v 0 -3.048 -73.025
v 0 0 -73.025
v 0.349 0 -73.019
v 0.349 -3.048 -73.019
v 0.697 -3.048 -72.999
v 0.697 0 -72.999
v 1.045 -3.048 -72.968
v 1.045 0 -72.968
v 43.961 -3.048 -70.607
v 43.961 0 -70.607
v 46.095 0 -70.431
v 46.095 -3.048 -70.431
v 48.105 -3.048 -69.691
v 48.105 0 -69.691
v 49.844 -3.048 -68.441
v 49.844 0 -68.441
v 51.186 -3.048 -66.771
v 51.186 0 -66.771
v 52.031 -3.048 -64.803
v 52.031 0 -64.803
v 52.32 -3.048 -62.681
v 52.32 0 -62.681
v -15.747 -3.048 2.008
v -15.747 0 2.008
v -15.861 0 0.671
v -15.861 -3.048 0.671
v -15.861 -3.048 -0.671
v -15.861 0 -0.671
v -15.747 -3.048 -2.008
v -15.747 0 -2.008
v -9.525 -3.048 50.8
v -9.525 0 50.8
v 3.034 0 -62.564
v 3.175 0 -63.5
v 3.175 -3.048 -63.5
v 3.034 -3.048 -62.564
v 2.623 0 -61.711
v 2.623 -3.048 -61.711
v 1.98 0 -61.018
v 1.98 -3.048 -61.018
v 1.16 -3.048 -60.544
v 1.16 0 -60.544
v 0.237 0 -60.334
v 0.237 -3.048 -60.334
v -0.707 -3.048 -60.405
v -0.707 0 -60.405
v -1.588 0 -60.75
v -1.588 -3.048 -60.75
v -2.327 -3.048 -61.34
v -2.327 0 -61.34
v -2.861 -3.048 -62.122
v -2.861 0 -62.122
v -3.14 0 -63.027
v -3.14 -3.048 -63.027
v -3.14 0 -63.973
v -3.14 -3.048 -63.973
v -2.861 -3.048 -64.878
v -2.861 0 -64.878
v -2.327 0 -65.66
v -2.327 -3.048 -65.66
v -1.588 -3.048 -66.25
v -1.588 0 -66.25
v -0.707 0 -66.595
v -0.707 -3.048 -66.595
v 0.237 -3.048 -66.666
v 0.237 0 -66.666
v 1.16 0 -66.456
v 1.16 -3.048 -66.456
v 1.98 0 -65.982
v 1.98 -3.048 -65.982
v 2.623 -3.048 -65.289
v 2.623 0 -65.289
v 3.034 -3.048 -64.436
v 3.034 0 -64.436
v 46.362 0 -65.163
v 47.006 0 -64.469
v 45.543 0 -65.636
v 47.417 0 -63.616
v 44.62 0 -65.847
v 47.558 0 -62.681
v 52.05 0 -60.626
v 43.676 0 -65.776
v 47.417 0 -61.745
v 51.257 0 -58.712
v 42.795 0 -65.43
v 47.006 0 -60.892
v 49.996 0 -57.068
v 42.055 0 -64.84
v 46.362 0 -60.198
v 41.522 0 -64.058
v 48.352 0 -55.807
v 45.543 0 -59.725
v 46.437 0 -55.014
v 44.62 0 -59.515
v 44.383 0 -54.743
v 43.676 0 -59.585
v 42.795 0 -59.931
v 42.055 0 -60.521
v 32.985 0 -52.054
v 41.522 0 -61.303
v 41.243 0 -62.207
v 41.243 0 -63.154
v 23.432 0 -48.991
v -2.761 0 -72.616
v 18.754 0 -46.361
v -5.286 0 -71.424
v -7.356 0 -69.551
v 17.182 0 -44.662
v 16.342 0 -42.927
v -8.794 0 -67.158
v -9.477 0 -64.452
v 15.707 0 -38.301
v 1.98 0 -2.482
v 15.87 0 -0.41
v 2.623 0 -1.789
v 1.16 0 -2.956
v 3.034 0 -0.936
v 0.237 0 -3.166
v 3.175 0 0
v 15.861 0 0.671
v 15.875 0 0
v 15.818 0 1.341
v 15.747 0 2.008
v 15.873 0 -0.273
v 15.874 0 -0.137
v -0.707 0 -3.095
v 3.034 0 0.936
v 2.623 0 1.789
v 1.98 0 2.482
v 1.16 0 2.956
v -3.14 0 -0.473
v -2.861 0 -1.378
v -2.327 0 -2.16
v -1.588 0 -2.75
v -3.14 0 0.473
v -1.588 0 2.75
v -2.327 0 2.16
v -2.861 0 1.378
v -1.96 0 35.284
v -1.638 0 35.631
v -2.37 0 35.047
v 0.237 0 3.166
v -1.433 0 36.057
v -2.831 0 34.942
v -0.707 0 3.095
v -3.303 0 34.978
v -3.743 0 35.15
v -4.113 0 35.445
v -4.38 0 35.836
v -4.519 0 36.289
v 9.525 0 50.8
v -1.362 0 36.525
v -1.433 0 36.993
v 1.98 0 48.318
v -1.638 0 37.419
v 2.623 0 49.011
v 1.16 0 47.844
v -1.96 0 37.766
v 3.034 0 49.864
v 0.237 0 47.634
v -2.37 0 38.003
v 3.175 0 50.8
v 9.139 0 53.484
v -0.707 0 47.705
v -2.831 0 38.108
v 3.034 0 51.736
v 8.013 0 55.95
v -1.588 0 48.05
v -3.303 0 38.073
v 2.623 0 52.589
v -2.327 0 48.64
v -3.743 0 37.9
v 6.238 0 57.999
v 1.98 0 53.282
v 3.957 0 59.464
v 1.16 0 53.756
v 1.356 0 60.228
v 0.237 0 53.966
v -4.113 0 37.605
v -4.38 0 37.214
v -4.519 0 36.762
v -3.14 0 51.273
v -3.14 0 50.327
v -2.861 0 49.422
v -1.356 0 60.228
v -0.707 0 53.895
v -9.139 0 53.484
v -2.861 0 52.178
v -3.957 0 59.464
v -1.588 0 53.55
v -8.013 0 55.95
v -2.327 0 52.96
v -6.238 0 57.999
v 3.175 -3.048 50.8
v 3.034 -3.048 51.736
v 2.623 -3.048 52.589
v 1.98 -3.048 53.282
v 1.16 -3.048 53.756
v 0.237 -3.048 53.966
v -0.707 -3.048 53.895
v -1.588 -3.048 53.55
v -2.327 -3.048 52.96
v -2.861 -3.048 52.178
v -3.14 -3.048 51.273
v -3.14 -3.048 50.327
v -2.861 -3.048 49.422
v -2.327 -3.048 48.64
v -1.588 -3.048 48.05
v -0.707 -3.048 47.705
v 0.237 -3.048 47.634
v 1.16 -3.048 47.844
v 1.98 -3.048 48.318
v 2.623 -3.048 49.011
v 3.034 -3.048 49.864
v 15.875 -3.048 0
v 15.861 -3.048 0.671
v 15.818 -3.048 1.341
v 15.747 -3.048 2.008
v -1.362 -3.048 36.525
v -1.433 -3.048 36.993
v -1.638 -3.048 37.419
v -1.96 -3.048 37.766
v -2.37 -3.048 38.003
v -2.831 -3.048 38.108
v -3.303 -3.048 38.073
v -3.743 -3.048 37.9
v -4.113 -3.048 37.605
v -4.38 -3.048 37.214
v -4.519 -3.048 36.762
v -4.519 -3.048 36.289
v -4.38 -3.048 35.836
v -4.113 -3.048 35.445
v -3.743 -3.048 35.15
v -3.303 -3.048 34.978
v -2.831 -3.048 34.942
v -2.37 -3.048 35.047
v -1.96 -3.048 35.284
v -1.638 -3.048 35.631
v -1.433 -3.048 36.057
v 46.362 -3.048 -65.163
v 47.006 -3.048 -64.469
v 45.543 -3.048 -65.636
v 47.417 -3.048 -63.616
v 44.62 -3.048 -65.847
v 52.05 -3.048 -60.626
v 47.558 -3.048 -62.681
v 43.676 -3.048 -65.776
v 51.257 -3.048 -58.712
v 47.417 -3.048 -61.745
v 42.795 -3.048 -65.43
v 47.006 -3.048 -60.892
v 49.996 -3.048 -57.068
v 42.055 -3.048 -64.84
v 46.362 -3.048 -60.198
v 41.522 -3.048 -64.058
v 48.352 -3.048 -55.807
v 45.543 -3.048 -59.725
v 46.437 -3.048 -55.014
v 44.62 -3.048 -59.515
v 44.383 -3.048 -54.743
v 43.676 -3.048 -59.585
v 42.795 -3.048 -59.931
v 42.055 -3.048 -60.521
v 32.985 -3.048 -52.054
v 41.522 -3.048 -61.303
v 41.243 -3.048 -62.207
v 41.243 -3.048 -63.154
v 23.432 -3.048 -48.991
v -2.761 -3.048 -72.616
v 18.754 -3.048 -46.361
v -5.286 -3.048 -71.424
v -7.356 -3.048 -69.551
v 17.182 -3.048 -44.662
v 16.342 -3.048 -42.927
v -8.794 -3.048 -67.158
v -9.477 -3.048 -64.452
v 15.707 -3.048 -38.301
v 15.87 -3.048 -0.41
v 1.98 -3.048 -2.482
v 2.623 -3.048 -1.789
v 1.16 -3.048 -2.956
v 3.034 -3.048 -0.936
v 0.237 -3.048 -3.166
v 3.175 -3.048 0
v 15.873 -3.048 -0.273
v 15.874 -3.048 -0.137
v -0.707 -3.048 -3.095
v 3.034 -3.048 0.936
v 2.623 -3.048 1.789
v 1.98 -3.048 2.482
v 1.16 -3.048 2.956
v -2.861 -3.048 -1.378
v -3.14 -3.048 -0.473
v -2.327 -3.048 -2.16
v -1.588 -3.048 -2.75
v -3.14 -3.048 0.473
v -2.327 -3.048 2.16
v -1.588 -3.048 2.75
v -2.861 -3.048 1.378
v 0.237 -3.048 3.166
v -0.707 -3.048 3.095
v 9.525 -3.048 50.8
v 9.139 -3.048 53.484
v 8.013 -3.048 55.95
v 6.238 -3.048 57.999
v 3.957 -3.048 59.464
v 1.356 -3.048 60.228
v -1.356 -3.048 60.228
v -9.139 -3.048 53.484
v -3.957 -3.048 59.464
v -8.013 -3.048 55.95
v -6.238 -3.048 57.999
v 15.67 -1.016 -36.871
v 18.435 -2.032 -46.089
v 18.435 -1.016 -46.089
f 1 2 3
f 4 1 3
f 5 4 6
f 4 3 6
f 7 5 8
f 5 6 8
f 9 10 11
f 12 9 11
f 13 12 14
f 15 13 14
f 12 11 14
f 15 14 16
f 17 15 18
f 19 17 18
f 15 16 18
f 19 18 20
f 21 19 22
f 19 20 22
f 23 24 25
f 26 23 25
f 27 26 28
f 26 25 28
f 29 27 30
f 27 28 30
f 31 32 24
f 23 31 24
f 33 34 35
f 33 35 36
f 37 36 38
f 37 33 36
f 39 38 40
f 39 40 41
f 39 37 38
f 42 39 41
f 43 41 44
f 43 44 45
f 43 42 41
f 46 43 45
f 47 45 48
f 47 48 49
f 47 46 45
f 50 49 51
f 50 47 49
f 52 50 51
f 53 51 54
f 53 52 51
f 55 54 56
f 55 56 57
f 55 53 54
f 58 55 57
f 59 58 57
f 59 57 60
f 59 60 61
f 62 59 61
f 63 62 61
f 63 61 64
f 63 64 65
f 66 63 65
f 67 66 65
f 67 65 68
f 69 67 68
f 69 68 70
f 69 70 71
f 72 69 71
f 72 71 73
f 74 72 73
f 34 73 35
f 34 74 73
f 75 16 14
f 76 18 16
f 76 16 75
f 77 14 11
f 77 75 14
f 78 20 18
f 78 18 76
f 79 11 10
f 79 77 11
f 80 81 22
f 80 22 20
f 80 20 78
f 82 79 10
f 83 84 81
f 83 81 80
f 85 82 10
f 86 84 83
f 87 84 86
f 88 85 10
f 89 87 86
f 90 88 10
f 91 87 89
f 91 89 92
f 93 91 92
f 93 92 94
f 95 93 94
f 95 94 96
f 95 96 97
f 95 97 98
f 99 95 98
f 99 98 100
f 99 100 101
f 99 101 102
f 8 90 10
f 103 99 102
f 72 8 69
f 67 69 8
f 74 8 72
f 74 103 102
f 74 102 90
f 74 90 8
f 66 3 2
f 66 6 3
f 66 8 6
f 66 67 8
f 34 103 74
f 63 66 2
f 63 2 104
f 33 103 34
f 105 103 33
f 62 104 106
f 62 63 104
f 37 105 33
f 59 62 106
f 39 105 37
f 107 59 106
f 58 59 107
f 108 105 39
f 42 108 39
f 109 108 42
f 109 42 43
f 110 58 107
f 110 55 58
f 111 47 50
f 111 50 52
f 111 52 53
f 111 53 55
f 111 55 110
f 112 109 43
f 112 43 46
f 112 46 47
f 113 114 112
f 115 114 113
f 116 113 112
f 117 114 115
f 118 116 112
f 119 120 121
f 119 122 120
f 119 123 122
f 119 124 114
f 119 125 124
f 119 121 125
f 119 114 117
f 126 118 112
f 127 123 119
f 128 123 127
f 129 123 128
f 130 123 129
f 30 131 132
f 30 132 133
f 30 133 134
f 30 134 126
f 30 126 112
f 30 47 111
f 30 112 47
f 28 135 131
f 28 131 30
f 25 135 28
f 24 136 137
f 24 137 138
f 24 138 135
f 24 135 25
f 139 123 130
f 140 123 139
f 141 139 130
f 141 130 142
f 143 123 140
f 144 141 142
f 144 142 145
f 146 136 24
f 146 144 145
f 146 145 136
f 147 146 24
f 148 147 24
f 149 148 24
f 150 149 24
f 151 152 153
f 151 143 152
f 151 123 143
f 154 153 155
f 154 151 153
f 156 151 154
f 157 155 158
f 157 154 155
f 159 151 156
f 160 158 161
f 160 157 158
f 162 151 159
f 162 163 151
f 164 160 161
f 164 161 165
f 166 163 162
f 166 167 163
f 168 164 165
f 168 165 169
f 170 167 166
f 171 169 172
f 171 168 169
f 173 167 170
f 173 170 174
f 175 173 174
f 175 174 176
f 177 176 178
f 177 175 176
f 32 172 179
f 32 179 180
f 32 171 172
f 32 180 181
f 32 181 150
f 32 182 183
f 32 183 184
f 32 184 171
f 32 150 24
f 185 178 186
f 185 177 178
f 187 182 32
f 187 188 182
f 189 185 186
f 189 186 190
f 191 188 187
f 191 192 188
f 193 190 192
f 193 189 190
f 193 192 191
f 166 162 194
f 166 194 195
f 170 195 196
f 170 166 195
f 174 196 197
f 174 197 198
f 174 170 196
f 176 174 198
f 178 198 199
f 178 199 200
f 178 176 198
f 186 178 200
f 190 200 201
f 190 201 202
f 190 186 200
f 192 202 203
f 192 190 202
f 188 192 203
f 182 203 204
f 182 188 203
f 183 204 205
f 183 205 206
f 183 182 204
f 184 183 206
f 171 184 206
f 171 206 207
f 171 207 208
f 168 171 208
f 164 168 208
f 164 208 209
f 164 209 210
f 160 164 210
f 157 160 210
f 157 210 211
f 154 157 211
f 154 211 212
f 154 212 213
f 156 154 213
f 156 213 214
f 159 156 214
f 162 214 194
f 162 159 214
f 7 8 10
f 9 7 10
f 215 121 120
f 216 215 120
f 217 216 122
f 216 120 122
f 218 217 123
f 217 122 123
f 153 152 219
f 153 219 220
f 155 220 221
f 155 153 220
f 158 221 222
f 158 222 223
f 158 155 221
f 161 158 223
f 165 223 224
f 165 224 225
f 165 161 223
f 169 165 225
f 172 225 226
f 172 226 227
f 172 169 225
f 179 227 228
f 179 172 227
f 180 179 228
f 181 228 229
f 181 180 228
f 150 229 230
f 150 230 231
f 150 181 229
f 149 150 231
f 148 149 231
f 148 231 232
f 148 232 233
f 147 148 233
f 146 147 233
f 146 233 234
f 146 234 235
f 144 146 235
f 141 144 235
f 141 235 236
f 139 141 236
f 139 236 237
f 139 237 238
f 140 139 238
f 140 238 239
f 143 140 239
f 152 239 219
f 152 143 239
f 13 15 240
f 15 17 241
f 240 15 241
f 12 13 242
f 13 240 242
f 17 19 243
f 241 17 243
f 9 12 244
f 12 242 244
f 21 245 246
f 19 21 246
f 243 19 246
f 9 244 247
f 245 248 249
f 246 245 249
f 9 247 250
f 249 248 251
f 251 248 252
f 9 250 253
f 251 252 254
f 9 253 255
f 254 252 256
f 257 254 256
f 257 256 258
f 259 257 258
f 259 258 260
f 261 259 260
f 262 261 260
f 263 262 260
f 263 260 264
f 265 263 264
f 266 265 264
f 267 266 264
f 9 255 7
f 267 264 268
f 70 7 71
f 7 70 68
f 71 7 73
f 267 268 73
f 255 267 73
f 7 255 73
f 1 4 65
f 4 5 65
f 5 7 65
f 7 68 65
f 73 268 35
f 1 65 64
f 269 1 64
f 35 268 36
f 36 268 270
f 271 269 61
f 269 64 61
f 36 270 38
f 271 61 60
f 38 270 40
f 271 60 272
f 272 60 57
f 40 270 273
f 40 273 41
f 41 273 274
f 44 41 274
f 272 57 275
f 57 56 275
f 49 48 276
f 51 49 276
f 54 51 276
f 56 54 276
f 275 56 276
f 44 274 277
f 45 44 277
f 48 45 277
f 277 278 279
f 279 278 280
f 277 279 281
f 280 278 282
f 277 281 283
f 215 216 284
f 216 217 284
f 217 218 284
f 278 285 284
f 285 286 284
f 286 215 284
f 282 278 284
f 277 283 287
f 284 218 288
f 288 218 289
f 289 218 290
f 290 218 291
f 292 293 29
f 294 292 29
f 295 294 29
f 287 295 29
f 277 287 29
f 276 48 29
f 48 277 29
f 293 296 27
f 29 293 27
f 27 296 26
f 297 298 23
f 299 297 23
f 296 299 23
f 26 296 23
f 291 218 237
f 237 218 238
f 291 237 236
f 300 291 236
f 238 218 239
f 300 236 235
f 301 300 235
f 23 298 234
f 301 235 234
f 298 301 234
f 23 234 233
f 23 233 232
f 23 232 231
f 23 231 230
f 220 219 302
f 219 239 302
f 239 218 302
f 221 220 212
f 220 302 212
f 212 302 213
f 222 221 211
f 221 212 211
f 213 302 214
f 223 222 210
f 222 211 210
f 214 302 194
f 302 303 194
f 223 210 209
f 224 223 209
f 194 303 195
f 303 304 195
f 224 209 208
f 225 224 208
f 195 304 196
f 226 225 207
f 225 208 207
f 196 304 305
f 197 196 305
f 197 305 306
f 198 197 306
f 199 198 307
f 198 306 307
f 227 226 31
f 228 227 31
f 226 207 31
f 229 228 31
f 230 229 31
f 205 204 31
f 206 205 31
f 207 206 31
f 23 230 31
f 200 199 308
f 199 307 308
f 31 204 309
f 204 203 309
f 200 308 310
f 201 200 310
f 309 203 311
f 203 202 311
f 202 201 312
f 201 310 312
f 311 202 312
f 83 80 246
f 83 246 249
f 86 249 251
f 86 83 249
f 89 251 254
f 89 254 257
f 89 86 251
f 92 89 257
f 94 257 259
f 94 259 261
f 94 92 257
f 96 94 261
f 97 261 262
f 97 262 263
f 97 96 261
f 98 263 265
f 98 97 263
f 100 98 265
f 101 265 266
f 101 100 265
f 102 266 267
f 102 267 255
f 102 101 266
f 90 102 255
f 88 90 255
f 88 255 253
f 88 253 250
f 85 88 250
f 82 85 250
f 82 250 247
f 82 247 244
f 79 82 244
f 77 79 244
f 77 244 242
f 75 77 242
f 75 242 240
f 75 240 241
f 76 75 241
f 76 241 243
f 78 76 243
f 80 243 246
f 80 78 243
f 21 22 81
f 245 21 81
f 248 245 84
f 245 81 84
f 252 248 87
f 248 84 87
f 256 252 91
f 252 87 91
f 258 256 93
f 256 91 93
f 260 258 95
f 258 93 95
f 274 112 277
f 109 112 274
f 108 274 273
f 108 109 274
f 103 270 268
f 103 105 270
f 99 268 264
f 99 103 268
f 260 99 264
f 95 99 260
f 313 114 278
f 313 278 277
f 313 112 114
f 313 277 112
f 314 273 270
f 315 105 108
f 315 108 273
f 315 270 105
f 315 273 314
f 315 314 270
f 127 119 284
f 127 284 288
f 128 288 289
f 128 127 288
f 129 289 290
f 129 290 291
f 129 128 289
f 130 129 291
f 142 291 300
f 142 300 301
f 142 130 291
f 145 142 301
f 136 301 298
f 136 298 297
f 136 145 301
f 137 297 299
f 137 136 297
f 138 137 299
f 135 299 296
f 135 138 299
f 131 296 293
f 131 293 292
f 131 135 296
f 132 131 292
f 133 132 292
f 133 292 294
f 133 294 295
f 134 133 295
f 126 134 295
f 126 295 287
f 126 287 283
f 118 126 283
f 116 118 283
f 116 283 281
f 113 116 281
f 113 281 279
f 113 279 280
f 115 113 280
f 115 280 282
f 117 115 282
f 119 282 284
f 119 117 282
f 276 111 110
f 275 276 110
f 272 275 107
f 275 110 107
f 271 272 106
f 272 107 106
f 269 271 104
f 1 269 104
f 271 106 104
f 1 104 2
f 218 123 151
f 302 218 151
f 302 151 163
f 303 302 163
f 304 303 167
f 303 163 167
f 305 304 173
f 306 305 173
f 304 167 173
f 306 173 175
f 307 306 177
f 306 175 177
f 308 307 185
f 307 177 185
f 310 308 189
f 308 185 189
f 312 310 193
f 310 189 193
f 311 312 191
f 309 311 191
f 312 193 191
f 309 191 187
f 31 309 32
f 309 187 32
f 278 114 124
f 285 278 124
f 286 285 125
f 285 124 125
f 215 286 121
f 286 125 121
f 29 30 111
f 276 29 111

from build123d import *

# Parameters (mm, degrees)
F0_R     = 3.175
F0_R_2   = 1.5875
F1_DEPTH = 3.048


with BuildPart() as f1:
    # F0 (on Front) → F1 (new body)
    with BuildSketch(Plane.XZ):
        with BuildLine():
            add(Edge.make_bspline(
                [(15.875, 0), (15.8732372033, -0.1365743579), (15.8714744066, -0.2731487158), (15.8697119149, -0.4097178745)],
                knots=[0, 0, 0, 0, 0.0040359027, 0.0040359027, 0.0040359027, 0.0040359027], degree=3))
            ThreePointArc((15.875, 0), (15.8430821396, 1.0061676396), (15.7474569047, 2.0082893304))
            ThreePointArc((15.7474569047, 2.0082893304), (0, 15.875), (-15.7474569047, 2.0082893304))
            ThreePointArc((-15.7474569047, 2.0082893304), (-15.875, 0), (-15.7474569047, -2.0082893304))
            ThreePointArc((-15.7474569047, -2.0082893304), (0.8016197645, -15.8547478931), (15.8697119149, -0.4097178745))
        make_face()
        Circle(F0_R, mode=Mode.SUBTRACT)
        with BuildLine():
            ThreePointArc((15.8697119149, -0.4097178745), (15.8736779237, -0.2048759994), (15.875, 0))
            add(Edge.make_bspline(
                [(15.875, 0), (15.8732372033, -0.1365743579), (15.8714744066, -0.2731487158), (15.8697119149, -0.4097178745)],
                knots=[0, 0, 0, 0, 0.0040359027, 0.0040359027, 0.0040359027, 0.0040359027], degree=3))
        make_face()
        with BuildLine():
            ThreePointArc((-15.7474569047, 2.0082893304), (0, 15.875), (15.7474569047, 2.0082893304))
            Line((15.7474569047, 2.0082893304), (9.525, 50.8))
            ThreePointArc((9.525, 50.8), (0, 41.275), (-9.525, 50.8))
            Line((-9.525, 50.8), (-15.7474569047, 2.0082893304))
        make_face()
        with Locations((-2.9496776406, 36.5252)):
            Circle(F0_R_2, mode=Mode.SUBTRACT)
        with BuildLine():
            add(Edge.make_bspline(
                [(15.8697119149, -0.4097178745), (15.6873811422, -14.5378753073), (15.4159472913, -35.8693253106), (16.221504585, -48.4230919996), (33.5230137181, -52.3059412595), (44.3829082704, -54.7431467772)],
                knots=[0.0040359027, 0.0040359027, 0.0040359027, 0.0040359027, 0.421552344, 0.6369171903, 1, 1, 1, 1], degree=3))
            ThreePointArc((15.8697119149, -0.4097178745), (0.8016197645, -15.8547478931), (-15.7474569047, -2.0082893304))
            Line((-15.7474569047, -2.0082893304), (-9.4773410414, -64.4516468803))
            ThreePointArc((-9.4773410414, -64.4516468803), (-0.4764197627, -53.986922201), (9.525, -63.5))
            ThreePointArc((9.525, -63.5), (7.0949392109, -69.8551131063), (1.0446928936, -72.9675362032))
            Line((1.0446928936, -72.9675362032), (43.960813643, -70.6069159106))
            ThreePointArc((43.960813643, -70.6069159106), (36.4482164838, -62.4695247705), (44.3829082704, -54.7431467772))
        make_face()
        with BuildLine():
            ThreePointArc((-9.525, 50.8), (0, 41.275), (9.525, 50.8))
            ThreePointArc((9.525, 50.8), (0, 60.325), (-9.525, 50.8))
        make_face()
        with Locations((0, 50.8)):
            Circle(F0_R, mode=Mode.SUBTRACT)
        with BuildLine():
            ThreePointArc((52.3204082704, -62.6806467772), (49.995568346, -57.0679867015), (44.3829082704, -54.7431467772))
            ThreePointArc((44.3829082704, -54.7431467772), (36.4482164838, -62.4695247705), (43.960813643, -70.6069159106))
            ThreePointArc((43.960813643, -70.6069159106), (49.8442968367, -68.4406069487), (52.3204082704, -62.6806467772))
        make_face()
        with Locations((44.3829082704, -62.6806467772)):
            Circle(F0_R, mode=Mode.SUBTRACT)
        with BuildLine():
            ThreePointArc((9.525, -63.5), (-0.4764197627, -53.986922201), (-9.4773410414, -64.4516468803))
            ThreePointArc((-9.4773410414, -64.4516468803), (-6.3898821767, -70.5636414665), (0, -73.025))
            Line((0, -73.025), (1.0446928936, -72.9675362032))
            ThreePointArc((1.0446928936, -72.9675362032), (7.0949392109, -69.8551131063), (9.525, -63.5))
        make_face()
        with Locations((0, -63.5)):
            Circle(F0_R, mode=Mode.SUBTRACT)
        with BuildLine():
            Line((1.0446928936, -72.9675362032), (0, -73.025))
            ThreePointArc((0, -73.025), (0.5231360554, -73.0106232008), (1.0446928936, -72.9675362032))
        make_face()
    extrude(amount=F1_DEPTH)


solid = f1.part
